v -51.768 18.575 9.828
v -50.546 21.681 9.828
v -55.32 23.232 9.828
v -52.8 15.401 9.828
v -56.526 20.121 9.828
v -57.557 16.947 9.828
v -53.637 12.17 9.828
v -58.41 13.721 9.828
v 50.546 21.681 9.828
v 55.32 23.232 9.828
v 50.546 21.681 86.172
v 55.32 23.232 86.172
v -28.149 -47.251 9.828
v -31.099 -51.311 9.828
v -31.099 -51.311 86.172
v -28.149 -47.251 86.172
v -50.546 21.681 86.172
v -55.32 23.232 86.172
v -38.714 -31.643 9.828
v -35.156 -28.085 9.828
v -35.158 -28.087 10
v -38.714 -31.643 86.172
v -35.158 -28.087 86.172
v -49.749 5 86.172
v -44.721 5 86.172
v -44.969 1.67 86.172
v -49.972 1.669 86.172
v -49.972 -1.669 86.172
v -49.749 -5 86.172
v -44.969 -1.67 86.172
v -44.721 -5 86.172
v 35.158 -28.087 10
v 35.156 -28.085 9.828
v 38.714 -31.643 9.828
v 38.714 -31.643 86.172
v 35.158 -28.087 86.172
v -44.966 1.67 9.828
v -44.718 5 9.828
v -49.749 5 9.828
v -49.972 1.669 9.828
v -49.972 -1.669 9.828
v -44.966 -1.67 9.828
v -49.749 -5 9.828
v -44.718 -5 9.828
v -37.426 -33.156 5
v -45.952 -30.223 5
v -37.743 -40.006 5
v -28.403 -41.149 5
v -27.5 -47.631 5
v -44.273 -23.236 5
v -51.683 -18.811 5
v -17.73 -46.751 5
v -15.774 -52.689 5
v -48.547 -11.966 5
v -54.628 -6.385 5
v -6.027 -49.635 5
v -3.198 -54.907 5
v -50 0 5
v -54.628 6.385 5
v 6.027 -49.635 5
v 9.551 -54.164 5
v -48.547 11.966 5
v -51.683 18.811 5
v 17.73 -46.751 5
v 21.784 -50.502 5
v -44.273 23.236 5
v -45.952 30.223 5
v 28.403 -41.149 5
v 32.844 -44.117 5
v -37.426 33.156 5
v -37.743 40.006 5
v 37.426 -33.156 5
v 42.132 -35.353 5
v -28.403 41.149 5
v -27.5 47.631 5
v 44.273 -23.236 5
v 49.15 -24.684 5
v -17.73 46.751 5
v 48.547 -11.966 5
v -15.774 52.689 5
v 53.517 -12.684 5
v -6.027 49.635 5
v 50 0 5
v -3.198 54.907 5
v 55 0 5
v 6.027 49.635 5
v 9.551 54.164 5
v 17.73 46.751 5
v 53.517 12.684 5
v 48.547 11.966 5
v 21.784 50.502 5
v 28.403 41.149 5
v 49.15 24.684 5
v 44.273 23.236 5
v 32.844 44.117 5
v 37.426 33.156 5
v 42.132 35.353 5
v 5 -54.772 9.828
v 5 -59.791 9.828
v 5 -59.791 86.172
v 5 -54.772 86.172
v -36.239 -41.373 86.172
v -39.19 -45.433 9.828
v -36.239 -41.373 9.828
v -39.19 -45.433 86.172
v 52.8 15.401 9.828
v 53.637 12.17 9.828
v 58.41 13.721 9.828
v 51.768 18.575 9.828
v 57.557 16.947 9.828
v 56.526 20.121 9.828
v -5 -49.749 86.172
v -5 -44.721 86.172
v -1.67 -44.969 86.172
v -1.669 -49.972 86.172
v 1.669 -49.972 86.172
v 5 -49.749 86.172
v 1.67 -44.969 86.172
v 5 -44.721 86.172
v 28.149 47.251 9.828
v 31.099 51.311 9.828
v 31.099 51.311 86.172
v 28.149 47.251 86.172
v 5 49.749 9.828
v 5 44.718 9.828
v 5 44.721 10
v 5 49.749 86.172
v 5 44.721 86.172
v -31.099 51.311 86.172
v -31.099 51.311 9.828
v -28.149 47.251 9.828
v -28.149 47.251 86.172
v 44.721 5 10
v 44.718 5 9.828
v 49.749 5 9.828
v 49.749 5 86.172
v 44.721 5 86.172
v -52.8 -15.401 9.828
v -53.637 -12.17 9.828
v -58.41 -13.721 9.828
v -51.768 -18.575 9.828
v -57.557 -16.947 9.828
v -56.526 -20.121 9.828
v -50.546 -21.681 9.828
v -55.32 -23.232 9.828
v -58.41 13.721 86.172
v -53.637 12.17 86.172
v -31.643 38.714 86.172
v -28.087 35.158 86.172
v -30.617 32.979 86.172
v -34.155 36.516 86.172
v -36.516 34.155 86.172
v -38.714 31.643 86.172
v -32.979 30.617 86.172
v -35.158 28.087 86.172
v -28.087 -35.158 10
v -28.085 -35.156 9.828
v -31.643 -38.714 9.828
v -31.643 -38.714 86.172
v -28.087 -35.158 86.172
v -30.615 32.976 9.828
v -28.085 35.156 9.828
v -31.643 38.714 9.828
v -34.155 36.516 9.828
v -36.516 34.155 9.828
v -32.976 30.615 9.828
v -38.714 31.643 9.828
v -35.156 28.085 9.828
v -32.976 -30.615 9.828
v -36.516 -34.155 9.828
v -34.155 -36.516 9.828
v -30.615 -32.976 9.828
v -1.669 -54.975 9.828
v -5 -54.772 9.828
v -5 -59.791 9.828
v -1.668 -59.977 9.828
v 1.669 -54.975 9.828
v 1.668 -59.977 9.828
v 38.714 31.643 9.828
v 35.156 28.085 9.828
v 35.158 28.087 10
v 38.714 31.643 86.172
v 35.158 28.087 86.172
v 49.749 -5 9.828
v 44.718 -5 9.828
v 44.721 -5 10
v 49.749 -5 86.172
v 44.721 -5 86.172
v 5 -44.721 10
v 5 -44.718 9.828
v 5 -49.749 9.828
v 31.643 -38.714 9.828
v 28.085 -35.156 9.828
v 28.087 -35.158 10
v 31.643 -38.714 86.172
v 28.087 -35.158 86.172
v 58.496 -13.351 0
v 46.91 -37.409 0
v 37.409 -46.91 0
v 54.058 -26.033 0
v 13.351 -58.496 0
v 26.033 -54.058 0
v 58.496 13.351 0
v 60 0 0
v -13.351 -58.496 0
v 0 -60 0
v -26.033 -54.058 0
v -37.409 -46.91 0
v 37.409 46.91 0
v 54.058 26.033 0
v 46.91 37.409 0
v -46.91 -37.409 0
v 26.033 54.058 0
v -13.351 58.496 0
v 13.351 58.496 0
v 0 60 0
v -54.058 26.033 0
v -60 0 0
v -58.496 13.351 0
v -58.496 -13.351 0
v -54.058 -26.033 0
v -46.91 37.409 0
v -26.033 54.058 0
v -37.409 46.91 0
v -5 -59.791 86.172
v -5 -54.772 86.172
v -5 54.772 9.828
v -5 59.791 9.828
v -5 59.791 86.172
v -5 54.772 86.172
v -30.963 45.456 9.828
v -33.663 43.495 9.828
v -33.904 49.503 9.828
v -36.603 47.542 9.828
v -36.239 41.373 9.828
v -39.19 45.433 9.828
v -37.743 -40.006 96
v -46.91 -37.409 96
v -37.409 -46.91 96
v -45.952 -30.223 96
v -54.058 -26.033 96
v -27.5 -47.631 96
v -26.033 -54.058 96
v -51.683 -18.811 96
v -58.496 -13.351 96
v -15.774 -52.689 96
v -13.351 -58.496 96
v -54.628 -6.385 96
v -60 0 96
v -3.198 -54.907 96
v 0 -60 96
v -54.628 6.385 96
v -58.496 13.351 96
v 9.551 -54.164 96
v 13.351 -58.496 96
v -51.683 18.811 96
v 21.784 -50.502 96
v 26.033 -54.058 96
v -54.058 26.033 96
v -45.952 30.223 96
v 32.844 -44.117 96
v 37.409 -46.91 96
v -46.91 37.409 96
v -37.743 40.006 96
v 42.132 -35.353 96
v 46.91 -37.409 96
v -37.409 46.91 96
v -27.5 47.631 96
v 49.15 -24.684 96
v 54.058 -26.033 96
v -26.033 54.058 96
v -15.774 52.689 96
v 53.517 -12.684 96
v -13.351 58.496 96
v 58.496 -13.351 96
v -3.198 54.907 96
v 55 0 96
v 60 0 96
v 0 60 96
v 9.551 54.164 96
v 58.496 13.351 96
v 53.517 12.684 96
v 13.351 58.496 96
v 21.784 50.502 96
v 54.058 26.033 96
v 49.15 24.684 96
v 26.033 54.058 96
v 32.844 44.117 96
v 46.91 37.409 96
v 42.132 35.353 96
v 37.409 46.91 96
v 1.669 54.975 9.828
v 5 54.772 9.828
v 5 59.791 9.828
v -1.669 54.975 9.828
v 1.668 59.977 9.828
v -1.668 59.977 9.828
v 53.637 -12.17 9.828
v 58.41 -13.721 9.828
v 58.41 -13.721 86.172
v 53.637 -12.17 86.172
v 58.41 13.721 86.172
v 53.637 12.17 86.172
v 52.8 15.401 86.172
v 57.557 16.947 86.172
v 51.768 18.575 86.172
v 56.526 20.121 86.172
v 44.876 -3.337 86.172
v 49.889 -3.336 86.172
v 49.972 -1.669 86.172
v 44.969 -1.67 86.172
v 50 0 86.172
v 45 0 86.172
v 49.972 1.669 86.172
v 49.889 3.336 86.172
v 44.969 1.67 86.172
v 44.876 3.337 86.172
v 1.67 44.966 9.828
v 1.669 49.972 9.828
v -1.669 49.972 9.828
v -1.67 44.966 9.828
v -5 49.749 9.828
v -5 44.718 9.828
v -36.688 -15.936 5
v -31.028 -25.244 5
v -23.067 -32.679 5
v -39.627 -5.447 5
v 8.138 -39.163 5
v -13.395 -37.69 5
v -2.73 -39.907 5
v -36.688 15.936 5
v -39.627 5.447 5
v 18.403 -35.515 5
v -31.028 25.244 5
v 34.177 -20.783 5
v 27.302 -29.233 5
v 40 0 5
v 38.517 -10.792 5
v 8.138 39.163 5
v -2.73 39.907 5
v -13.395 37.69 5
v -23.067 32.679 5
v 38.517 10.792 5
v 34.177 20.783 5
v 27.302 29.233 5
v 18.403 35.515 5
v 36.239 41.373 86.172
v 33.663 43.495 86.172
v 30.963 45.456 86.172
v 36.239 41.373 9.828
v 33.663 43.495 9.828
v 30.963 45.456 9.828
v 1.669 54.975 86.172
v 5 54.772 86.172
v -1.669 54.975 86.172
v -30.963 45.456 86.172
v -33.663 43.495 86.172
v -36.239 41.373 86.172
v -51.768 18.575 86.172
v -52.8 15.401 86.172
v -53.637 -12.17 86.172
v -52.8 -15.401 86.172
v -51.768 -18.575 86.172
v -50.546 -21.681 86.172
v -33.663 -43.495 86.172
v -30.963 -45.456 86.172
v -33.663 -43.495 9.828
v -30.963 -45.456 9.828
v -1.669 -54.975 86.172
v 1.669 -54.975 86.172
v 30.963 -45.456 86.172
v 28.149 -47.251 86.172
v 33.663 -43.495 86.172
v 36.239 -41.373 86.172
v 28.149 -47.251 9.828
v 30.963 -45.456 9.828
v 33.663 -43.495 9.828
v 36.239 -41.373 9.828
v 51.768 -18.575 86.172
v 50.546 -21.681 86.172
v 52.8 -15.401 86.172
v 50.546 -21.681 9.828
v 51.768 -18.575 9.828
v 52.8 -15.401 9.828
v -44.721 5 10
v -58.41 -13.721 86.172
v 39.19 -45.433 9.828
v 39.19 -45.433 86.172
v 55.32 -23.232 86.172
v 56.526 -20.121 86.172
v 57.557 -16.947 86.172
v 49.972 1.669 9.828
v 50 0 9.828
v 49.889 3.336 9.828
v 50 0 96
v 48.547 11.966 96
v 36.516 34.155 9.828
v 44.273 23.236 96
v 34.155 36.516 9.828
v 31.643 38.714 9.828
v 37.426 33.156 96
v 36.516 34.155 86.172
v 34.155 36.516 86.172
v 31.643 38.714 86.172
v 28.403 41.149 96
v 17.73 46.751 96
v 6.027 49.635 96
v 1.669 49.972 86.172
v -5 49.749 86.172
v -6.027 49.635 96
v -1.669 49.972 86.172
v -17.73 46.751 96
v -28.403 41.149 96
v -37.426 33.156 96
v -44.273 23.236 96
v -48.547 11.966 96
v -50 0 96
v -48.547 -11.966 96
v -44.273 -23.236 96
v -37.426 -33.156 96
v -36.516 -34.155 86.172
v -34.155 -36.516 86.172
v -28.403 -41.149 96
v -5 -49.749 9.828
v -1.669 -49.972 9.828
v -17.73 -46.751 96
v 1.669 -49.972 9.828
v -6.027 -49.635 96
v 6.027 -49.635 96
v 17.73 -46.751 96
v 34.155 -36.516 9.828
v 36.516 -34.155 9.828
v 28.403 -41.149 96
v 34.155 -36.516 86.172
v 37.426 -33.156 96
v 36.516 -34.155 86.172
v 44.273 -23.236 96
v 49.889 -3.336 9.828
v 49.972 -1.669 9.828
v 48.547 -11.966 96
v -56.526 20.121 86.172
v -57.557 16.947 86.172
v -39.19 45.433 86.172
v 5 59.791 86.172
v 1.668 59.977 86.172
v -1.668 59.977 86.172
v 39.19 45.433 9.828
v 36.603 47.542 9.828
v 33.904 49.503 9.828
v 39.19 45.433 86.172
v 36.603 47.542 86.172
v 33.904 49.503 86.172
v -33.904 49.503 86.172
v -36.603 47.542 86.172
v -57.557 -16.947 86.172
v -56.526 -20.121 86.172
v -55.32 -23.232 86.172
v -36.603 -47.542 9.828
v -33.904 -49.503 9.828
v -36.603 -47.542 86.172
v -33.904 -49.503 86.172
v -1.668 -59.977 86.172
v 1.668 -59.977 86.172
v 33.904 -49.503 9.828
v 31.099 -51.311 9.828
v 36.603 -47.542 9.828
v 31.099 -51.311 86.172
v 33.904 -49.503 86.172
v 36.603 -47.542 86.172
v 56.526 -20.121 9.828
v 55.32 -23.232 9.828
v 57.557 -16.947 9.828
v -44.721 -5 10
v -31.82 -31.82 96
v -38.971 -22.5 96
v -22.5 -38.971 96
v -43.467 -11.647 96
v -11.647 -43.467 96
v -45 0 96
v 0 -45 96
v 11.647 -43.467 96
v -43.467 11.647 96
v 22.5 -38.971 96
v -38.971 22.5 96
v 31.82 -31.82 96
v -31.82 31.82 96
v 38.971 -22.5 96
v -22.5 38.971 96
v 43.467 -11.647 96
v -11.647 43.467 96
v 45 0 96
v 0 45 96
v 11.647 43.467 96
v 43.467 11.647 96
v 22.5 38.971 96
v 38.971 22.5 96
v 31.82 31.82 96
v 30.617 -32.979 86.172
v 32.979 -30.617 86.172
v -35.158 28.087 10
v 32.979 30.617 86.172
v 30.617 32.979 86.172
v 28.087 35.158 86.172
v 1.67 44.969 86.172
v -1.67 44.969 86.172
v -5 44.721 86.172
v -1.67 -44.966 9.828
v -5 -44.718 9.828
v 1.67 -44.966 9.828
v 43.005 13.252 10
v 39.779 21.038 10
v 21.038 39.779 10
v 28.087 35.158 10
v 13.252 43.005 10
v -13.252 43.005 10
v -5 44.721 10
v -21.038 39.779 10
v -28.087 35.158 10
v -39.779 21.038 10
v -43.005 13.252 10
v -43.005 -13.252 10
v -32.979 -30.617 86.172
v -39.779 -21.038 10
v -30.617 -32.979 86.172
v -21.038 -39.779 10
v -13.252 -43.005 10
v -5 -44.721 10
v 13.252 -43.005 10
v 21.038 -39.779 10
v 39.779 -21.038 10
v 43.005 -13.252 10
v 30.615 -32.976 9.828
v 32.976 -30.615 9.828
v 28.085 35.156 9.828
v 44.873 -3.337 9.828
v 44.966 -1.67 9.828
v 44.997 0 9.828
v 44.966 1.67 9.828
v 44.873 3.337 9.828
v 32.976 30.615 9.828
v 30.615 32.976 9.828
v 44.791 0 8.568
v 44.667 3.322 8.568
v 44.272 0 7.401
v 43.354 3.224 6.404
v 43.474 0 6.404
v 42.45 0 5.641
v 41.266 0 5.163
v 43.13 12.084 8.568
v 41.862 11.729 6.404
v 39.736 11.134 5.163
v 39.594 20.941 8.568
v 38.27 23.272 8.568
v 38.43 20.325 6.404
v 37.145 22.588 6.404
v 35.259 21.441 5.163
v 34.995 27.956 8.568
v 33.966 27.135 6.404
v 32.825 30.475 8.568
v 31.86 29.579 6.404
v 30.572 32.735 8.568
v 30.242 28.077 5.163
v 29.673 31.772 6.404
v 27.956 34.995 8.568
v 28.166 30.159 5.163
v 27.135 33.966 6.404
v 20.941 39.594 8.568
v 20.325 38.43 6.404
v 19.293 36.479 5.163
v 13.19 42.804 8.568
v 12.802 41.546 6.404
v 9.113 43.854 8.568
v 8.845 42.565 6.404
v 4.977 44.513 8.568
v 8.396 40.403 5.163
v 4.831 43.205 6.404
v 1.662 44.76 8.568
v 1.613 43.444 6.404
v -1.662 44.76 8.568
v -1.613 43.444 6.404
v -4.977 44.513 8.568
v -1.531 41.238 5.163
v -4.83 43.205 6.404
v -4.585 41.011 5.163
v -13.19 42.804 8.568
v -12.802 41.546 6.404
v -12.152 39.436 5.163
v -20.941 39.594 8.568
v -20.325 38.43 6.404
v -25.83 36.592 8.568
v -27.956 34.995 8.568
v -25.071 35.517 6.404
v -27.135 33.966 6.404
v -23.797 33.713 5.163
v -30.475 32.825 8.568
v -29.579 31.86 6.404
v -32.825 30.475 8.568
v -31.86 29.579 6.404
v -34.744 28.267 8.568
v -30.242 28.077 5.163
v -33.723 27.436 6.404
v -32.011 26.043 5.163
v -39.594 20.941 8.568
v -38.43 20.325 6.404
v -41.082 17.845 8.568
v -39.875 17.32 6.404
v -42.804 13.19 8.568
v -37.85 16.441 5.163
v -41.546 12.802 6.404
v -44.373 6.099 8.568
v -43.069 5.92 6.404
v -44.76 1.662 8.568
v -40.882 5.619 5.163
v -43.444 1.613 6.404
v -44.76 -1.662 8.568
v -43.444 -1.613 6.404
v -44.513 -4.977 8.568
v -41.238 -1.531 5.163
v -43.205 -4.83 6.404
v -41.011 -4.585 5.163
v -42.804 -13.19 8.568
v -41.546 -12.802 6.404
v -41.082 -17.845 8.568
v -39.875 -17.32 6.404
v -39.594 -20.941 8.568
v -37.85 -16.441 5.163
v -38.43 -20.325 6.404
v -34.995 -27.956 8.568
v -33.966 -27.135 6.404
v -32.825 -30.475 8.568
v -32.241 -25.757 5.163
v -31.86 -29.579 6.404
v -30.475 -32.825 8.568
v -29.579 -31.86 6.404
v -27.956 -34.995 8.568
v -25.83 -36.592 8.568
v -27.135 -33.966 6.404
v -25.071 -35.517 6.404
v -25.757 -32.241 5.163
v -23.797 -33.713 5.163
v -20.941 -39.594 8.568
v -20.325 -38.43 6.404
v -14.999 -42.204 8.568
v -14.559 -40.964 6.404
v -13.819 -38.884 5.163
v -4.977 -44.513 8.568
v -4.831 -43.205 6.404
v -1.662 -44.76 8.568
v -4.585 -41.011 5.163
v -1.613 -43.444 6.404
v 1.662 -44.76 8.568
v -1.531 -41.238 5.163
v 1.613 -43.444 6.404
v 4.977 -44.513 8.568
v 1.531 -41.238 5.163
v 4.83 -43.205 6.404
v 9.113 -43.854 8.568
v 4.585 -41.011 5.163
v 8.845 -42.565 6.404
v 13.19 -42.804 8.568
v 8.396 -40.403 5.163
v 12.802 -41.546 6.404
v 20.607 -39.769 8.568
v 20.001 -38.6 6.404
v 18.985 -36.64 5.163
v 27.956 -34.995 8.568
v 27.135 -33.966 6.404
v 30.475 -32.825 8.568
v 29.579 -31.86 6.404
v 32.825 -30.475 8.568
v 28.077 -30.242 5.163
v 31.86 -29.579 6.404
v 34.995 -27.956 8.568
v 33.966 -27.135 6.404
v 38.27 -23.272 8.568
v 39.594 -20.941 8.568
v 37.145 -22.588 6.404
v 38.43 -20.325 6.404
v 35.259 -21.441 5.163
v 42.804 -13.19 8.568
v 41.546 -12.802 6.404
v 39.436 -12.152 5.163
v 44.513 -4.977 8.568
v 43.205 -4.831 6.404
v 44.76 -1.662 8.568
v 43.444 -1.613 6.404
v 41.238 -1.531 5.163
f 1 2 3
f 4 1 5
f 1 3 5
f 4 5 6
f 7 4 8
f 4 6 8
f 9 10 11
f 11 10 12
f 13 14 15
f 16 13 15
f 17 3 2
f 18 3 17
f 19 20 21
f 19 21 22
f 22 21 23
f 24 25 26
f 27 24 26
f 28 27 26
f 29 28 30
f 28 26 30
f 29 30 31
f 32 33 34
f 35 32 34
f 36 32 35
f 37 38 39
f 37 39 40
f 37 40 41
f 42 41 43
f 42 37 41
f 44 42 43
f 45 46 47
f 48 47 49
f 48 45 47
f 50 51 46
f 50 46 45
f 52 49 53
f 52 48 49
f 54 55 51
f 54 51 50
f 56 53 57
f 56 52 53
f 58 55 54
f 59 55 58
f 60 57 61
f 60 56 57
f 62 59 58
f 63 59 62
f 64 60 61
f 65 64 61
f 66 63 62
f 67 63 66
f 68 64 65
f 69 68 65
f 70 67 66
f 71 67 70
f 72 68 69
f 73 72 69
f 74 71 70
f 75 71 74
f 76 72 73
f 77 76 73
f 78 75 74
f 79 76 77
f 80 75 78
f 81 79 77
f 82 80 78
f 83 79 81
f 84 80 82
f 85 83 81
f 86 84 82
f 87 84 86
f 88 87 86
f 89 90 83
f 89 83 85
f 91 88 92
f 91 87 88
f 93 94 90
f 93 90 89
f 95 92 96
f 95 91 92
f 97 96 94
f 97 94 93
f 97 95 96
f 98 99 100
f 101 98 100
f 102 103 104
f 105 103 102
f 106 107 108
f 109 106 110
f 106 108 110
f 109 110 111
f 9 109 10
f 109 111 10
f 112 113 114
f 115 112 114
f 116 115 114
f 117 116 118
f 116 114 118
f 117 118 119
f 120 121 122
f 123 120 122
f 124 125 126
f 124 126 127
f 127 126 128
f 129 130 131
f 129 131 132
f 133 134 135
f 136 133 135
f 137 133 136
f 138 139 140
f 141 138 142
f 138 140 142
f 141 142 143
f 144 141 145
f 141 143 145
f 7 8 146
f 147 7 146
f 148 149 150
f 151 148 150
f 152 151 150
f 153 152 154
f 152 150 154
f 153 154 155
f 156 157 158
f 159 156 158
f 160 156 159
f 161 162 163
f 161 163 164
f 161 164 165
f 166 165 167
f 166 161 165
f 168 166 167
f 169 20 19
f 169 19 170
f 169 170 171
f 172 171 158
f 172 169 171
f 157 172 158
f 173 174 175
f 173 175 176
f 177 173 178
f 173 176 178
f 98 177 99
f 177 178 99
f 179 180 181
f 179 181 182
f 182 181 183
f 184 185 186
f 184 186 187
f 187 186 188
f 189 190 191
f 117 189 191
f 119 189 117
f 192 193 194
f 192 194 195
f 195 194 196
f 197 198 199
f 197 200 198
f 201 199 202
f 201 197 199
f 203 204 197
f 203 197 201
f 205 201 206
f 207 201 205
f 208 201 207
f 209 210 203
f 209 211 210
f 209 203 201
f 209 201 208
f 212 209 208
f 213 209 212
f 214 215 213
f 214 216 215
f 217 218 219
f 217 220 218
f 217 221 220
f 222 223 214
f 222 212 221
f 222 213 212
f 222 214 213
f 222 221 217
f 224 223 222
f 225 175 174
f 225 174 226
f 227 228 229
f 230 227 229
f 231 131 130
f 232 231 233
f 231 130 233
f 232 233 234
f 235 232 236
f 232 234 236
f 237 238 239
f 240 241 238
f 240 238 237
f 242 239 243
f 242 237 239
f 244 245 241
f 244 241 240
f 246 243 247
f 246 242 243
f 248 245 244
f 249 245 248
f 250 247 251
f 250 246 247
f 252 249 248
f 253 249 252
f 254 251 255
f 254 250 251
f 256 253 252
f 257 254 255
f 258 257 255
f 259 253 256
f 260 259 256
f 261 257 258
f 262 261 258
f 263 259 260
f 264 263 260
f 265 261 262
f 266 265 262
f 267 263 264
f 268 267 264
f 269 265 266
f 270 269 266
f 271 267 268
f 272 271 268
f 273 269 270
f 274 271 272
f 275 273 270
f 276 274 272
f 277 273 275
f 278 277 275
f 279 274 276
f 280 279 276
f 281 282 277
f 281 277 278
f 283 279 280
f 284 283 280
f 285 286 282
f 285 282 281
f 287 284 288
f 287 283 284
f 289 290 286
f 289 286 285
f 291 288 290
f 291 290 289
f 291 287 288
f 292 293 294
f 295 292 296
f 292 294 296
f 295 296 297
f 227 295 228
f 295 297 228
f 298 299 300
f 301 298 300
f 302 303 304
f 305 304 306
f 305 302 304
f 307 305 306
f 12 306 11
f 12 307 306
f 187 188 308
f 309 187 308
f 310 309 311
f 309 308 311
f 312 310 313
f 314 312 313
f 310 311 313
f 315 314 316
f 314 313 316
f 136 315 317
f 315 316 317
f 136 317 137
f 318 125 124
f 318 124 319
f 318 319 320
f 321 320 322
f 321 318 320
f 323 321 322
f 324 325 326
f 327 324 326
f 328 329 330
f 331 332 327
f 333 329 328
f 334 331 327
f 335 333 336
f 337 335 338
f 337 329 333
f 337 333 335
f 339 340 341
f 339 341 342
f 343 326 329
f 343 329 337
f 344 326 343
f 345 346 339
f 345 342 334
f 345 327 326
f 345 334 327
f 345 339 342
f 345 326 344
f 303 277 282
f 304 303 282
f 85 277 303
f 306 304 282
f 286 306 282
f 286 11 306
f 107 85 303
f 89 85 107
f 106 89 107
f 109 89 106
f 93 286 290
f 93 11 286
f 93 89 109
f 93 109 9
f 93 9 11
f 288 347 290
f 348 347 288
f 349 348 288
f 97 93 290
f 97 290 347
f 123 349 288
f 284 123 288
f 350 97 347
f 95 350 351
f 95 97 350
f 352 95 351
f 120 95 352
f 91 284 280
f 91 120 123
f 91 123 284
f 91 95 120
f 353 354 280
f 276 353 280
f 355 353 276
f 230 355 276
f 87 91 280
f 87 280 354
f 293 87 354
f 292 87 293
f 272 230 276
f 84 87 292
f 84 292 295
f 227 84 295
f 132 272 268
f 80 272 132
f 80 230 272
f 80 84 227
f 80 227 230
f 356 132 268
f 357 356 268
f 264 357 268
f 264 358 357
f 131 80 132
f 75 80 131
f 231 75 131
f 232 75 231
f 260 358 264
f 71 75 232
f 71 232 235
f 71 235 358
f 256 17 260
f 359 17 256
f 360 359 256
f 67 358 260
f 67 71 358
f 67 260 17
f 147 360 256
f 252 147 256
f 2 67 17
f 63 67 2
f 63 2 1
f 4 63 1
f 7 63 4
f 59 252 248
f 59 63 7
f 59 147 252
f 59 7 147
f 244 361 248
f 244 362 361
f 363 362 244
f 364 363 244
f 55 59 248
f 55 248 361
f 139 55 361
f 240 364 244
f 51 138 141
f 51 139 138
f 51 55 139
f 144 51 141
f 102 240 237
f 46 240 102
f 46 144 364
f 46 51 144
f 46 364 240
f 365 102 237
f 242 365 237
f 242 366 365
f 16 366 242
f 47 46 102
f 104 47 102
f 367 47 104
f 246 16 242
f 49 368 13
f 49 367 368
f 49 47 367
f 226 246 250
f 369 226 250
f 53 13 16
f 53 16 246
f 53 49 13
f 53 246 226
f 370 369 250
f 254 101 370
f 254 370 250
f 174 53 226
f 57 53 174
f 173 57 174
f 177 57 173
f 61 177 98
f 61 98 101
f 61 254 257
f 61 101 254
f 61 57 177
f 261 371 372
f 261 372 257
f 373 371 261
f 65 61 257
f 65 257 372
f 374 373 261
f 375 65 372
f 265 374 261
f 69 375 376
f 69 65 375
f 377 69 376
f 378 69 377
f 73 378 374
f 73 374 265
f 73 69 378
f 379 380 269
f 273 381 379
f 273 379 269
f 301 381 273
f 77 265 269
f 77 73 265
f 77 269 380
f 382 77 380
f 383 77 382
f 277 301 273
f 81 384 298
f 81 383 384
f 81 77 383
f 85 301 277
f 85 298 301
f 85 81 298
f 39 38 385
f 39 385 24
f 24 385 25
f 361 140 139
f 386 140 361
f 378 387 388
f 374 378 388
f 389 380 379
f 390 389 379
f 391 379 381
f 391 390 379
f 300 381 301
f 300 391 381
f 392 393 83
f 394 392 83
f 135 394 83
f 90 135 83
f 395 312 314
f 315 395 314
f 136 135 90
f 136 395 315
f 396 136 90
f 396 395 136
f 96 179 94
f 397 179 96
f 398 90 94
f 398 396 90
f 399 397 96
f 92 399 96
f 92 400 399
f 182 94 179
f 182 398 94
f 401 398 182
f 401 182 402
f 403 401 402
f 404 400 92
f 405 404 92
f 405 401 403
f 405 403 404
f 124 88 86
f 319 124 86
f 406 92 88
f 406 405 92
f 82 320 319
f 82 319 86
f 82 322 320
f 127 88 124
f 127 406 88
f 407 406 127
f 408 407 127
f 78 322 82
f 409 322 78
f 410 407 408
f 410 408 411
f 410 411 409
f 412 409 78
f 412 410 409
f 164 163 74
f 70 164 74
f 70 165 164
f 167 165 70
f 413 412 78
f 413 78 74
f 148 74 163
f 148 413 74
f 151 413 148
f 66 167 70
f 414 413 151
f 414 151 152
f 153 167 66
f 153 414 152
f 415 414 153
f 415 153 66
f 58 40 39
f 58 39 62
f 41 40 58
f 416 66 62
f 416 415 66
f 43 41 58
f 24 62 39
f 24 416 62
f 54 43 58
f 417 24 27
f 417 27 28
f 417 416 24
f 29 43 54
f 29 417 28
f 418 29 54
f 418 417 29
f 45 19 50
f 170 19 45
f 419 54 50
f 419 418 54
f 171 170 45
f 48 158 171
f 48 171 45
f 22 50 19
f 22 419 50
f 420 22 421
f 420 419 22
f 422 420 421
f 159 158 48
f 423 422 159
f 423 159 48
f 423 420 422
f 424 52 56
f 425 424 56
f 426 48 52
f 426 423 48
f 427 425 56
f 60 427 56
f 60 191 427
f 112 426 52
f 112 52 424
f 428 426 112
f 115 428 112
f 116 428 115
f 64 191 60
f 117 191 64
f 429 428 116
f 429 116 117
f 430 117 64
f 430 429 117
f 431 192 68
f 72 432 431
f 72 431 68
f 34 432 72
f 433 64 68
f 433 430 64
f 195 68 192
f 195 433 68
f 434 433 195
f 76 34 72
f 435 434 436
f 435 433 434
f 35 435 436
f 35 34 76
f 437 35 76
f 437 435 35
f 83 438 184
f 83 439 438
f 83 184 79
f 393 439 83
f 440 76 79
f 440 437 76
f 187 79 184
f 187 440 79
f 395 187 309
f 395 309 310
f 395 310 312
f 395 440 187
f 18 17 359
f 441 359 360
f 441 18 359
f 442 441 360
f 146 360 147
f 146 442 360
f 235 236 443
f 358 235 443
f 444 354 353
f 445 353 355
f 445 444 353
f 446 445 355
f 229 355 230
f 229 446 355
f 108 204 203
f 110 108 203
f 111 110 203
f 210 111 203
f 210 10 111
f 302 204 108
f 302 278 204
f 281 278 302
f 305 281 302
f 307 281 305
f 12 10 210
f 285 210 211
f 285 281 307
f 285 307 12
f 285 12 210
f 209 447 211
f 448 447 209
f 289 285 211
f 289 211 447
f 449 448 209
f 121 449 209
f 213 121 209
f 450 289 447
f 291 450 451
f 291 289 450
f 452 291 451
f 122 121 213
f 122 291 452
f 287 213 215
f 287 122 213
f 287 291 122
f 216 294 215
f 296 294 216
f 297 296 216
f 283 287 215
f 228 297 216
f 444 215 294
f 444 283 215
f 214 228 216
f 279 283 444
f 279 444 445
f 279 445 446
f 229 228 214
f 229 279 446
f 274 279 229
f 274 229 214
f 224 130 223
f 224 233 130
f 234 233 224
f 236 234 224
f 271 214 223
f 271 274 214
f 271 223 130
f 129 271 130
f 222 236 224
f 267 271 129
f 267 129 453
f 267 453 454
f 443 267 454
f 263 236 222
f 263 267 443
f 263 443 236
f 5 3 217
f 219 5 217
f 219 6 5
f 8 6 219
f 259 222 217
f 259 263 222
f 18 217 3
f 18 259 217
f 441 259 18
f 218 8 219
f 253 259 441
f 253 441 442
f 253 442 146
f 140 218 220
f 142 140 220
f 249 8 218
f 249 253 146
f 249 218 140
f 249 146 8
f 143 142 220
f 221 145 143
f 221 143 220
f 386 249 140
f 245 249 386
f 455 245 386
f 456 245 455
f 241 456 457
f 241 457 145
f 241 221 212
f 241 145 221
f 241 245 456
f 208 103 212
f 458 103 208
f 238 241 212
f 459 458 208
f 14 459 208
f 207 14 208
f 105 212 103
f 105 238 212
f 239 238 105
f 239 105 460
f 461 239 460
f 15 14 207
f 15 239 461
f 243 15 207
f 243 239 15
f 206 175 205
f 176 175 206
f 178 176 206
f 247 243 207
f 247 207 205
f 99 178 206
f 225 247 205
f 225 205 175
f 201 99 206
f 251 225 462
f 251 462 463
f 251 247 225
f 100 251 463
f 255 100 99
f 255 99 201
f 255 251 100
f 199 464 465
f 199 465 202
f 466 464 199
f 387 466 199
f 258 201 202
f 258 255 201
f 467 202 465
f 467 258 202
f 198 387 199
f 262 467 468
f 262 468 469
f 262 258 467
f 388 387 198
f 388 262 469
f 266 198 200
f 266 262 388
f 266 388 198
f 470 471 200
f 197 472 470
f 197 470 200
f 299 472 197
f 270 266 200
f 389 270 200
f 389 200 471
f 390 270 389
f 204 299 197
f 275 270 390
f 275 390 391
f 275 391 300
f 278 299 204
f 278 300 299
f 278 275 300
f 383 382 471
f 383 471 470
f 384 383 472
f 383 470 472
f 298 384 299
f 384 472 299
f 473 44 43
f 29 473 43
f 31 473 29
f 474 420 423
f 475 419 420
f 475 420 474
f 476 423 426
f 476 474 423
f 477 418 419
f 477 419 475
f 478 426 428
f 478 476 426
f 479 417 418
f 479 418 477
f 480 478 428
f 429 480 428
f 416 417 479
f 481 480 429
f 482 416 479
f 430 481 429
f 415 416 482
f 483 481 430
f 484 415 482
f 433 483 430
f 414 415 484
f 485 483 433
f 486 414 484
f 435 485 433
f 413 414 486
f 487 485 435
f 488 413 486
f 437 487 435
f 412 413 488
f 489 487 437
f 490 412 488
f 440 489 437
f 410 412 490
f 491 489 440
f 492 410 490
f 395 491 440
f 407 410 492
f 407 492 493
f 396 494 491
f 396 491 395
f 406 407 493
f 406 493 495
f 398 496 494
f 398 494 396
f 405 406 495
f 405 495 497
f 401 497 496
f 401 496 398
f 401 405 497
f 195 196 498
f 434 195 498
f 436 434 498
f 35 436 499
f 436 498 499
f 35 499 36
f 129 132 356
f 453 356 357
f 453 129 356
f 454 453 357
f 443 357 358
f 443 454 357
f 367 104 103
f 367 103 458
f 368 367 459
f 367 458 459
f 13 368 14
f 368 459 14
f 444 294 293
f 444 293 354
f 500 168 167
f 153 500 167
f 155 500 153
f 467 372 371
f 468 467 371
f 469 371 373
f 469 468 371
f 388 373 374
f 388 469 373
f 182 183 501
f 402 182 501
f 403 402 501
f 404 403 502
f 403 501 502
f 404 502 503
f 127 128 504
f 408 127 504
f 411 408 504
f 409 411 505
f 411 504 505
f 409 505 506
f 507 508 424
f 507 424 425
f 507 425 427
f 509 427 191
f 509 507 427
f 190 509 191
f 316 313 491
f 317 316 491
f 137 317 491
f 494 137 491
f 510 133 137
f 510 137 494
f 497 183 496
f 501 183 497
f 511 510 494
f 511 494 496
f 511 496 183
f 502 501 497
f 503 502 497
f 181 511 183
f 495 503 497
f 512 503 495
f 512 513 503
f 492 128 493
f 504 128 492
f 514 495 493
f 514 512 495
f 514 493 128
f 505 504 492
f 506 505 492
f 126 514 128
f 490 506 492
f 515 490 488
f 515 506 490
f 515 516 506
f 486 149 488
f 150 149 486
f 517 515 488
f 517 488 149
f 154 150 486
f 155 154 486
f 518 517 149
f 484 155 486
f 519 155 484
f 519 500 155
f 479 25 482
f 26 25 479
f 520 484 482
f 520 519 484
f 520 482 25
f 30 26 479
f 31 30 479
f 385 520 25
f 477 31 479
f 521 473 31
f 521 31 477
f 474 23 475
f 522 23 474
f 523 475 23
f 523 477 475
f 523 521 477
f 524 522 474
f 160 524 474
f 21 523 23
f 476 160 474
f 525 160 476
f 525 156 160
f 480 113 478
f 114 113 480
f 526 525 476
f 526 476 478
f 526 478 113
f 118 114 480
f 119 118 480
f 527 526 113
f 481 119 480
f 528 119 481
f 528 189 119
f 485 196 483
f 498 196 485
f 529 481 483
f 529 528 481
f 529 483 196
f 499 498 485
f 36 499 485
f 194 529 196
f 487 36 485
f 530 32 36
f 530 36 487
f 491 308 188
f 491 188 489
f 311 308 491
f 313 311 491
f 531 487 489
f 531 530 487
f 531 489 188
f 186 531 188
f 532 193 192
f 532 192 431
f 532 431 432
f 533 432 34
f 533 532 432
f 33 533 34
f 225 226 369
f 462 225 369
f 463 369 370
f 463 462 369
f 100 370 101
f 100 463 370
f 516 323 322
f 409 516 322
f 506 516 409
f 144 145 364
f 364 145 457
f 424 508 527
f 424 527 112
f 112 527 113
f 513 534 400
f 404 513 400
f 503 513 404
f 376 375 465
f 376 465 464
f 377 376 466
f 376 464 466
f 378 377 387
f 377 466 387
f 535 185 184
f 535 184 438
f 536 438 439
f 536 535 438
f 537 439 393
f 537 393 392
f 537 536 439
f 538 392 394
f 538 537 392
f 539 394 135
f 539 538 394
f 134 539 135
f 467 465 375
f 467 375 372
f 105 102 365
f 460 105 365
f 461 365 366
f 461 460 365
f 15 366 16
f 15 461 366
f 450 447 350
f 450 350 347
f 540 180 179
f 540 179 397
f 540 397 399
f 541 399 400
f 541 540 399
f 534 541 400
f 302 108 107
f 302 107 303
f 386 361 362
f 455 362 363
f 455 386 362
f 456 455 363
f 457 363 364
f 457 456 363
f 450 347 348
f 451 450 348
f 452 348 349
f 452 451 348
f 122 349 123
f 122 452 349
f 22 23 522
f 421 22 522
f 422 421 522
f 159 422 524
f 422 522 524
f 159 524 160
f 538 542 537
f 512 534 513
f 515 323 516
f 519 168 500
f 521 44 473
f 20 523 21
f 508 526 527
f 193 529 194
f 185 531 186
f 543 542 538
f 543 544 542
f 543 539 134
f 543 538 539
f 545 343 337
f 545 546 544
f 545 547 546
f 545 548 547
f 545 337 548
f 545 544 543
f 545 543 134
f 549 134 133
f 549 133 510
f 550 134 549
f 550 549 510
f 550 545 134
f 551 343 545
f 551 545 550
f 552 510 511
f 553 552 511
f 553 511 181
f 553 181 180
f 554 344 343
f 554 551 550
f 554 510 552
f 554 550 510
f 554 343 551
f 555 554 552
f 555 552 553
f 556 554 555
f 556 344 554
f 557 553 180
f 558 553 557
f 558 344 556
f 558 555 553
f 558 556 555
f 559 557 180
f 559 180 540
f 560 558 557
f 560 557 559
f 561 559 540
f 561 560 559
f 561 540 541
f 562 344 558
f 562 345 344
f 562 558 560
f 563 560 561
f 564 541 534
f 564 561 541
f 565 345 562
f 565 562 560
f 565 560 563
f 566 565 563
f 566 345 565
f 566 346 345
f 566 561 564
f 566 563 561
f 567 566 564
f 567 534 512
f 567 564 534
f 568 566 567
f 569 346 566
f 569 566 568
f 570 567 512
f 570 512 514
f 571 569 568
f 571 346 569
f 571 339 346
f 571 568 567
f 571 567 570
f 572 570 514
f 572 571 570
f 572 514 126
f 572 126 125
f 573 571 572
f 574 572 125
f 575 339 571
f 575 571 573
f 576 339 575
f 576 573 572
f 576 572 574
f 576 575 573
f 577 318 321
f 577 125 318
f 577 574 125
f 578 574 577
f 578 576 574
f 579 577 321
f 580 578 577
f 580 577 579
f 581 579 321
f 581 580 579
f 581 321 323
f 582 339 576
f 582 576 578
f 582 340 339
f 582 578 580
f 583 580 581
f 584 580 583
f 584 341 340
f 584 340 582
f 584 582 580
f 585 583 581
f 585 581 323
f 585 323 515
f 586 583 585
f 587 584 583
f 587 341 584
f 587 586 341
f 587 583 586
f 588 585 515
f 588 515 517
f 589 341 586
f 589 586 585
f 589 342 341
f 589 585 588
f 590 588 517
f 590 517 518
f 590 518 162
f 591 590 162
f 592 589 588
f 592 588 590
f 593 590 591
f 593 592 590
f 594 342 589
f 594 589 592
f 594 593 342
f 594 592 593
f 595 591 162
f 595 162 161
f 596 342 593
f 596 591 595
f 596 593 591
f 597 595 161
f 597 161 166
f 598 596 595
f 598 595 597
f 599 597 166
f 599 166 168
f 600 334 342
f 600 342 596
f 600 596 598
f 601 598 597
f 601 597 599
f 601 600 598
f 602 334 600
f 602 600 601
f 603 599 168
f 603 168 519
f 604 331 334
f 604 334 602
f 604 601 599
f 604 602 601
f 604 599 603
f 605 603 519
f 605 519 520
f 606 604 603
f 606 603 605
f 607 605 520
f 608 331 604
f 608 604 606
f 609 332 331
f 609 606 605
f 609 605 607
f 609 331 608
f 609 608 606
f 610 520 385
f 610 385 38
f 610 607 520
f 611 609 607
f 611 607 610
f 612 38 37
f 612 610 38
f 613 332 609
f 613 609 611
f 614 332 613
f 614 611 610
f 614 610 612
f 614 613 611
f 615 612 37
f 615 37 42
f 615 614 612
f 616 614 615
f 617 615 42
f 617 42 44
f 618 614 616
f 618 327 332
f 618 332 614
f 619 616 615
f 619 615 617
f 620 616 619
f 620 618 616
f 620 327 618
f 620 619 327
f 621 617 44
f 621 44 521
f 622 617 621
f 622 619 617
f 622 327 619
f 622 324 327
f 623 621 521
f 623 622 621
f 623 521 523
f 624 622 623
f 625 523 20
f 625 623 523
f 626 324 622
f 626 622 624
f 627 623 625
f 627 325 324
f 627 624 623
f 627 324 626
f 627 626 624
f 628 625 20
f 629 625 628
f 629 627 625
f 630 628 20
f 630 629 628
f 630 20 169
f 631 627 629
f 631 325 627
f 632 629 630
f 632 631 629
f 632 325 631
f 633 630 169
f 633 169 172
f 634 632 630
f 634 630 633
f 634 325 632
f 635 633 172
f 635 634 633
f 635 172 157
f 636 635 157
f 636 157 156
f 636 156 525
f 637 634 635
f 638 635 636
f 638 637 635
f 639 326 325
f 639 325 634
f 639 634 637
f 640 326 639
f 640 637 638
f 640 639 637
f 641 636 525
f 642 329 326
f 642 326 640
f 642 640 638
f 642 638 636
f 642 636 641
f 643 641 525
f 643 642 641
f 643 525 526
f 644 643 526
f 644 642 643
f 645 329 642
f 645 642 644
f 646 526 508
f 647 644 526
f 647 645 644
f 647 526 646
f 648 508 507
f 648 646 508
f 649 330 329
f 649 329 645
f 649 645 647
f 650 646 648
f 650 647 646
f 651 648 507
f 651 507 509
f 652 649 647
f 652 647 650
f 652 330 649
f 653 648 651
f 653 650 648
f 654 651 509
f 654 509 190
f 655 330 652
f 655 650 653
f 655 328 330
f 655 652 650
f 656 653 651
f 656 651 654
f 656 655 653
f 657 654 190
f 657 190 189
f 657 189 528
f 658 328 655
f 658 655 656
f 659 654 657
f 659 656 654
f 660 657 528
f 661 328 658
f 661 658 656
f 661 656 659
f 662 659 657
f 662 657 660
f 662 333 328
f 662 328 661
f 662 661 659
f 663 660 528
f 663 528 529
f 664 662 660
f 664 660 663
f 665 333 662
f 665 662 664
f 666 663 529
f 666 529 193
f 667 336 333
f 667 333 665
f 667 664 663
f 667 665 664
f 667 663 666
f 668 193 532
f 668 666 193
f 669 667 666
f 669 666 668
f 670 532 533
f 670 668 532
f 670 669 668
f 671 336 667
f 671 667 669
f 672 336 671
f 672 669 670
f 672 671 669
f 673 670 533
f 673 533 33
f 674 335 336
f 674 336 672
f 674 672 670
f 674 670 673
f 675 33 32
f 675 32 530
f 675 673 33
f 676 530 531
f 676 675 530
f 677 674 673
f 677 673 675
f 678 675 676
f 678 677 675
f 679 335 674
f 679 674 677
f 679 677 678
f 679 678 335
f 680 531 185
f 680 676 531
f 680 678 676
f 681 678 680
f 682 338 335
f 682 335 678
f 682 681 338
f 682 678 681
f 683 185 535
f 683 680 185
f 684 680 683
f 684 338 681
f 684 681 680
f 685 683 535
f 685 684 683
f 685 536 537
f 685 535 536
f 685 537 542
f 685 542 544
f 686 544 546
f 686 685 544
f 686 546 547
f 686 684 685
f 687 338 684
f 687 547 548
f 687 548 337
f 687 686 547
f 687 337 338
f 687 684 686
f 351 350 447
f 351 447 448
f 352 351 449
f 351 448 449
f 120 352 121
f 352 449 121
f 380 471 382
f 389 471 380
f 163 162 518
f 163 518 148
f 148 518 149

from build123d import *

# Parameters (mm, degrees)
F2_W            = 10
F2_H            = 76.3443418741
F3_REACH        = 136.997483921
F3_COPIES_COUNT = 8
F5_W            = 10
F5_H            = 76.3443418741
F6_REACH        = 211.997483921
F6_COPIES_COUNT = 10


# Not quite as in the source:
# - a pattern or mirror of a feature is missing from the dataset's text; its kind, count and spacing are read off the source's solid


with BuildPart() as f1:
    # F0 (on Front) → F1 (revolve)
    with BuildSketch(Plane.XZ):
        with BuildLine():
            Line((0, 5), (0, 0))
            Line((0, 0), (60, 0))
            Line((60, 0), (60, 96))
            Line((60, 96), (55, 96))
            Line((55, 96), (55, 5))
            Line((55, 5), (50, 5))
            Line((50, 5), (50, 96))
            Line((50, 96), (45, 96))
            Line((45, 96), (45, 10))
            ThreePointArc((45, 10), (43.5355339059, 6.4644660941), (40, 5))
            Line((40, 5), (0, 5))
        make_face()
    revolve(axis=Axis((0, 0, 2.5), (0, 0, 1)))

    f3_end = f1.faces().sort_by_distance((-50, 0, 50.5))[0]
    # F2 (on Front) → F3 (cut, up to a face of the model that its end follows)
    with BuildSketch(Plane.XZ):
        with Locations((0, 48)):
            Rectangle(F2_W, F2_H)
    f3_long = extrude(amount=F3_REACH, mode=Mode.PRIVATE)
    f3 = split(f3_long, bisect_by=f3_end, keep=Keep.BOTTOM, mode=Mode.PRIVATE)
    add(f3, mode=Mode.SUBTRACT)

    # F3_copies: F3 ×8 about axis
    f3_copies_axis = Axis((0, 0, 0), (0, 0, 1))
    for i in range(1, F3_COPIES_COUNT):
        add(f3.rotate(f3_copies_axis, i * 360 / F3_COPIES_COUNT), mode=Mode.SUBTRACT)

    f6_end = f1.faces().sort_by_distance((-55, 0, 50.5))[0]
    # F5 (on offset) → F6 (cut, up to a face of the model that its end follows)
    with BuildSketch(Plane.XZ.offset(75)):
        with Locations((0, 48)):
            Rectangle(F5_W, F5_H)
    f6_long = extrude(amount=-F6_REACH, mode=Mode.PRIVATE)
    f6 = split(f6_long, bisect_by=f6_end, keep=Keep.ALL, mode=Mode.PRIVATE).solids().sort_by_distance((0, -75, 48))[0]
    add(f6, mode=Mode.SUBTRACT)

    # F6_copies: F6 ×10 about axis
    f6_copies_axis = Axis((0, 0, 0), (0, 0, 1))
    for i in range(1, F6_COPIES_COUNT):
        add(f6.rotate(f6_copies_axis, i * 360 / F6_COPIES_COUNT), mode=Mode.SUBTRACT)


solid = f1.part
